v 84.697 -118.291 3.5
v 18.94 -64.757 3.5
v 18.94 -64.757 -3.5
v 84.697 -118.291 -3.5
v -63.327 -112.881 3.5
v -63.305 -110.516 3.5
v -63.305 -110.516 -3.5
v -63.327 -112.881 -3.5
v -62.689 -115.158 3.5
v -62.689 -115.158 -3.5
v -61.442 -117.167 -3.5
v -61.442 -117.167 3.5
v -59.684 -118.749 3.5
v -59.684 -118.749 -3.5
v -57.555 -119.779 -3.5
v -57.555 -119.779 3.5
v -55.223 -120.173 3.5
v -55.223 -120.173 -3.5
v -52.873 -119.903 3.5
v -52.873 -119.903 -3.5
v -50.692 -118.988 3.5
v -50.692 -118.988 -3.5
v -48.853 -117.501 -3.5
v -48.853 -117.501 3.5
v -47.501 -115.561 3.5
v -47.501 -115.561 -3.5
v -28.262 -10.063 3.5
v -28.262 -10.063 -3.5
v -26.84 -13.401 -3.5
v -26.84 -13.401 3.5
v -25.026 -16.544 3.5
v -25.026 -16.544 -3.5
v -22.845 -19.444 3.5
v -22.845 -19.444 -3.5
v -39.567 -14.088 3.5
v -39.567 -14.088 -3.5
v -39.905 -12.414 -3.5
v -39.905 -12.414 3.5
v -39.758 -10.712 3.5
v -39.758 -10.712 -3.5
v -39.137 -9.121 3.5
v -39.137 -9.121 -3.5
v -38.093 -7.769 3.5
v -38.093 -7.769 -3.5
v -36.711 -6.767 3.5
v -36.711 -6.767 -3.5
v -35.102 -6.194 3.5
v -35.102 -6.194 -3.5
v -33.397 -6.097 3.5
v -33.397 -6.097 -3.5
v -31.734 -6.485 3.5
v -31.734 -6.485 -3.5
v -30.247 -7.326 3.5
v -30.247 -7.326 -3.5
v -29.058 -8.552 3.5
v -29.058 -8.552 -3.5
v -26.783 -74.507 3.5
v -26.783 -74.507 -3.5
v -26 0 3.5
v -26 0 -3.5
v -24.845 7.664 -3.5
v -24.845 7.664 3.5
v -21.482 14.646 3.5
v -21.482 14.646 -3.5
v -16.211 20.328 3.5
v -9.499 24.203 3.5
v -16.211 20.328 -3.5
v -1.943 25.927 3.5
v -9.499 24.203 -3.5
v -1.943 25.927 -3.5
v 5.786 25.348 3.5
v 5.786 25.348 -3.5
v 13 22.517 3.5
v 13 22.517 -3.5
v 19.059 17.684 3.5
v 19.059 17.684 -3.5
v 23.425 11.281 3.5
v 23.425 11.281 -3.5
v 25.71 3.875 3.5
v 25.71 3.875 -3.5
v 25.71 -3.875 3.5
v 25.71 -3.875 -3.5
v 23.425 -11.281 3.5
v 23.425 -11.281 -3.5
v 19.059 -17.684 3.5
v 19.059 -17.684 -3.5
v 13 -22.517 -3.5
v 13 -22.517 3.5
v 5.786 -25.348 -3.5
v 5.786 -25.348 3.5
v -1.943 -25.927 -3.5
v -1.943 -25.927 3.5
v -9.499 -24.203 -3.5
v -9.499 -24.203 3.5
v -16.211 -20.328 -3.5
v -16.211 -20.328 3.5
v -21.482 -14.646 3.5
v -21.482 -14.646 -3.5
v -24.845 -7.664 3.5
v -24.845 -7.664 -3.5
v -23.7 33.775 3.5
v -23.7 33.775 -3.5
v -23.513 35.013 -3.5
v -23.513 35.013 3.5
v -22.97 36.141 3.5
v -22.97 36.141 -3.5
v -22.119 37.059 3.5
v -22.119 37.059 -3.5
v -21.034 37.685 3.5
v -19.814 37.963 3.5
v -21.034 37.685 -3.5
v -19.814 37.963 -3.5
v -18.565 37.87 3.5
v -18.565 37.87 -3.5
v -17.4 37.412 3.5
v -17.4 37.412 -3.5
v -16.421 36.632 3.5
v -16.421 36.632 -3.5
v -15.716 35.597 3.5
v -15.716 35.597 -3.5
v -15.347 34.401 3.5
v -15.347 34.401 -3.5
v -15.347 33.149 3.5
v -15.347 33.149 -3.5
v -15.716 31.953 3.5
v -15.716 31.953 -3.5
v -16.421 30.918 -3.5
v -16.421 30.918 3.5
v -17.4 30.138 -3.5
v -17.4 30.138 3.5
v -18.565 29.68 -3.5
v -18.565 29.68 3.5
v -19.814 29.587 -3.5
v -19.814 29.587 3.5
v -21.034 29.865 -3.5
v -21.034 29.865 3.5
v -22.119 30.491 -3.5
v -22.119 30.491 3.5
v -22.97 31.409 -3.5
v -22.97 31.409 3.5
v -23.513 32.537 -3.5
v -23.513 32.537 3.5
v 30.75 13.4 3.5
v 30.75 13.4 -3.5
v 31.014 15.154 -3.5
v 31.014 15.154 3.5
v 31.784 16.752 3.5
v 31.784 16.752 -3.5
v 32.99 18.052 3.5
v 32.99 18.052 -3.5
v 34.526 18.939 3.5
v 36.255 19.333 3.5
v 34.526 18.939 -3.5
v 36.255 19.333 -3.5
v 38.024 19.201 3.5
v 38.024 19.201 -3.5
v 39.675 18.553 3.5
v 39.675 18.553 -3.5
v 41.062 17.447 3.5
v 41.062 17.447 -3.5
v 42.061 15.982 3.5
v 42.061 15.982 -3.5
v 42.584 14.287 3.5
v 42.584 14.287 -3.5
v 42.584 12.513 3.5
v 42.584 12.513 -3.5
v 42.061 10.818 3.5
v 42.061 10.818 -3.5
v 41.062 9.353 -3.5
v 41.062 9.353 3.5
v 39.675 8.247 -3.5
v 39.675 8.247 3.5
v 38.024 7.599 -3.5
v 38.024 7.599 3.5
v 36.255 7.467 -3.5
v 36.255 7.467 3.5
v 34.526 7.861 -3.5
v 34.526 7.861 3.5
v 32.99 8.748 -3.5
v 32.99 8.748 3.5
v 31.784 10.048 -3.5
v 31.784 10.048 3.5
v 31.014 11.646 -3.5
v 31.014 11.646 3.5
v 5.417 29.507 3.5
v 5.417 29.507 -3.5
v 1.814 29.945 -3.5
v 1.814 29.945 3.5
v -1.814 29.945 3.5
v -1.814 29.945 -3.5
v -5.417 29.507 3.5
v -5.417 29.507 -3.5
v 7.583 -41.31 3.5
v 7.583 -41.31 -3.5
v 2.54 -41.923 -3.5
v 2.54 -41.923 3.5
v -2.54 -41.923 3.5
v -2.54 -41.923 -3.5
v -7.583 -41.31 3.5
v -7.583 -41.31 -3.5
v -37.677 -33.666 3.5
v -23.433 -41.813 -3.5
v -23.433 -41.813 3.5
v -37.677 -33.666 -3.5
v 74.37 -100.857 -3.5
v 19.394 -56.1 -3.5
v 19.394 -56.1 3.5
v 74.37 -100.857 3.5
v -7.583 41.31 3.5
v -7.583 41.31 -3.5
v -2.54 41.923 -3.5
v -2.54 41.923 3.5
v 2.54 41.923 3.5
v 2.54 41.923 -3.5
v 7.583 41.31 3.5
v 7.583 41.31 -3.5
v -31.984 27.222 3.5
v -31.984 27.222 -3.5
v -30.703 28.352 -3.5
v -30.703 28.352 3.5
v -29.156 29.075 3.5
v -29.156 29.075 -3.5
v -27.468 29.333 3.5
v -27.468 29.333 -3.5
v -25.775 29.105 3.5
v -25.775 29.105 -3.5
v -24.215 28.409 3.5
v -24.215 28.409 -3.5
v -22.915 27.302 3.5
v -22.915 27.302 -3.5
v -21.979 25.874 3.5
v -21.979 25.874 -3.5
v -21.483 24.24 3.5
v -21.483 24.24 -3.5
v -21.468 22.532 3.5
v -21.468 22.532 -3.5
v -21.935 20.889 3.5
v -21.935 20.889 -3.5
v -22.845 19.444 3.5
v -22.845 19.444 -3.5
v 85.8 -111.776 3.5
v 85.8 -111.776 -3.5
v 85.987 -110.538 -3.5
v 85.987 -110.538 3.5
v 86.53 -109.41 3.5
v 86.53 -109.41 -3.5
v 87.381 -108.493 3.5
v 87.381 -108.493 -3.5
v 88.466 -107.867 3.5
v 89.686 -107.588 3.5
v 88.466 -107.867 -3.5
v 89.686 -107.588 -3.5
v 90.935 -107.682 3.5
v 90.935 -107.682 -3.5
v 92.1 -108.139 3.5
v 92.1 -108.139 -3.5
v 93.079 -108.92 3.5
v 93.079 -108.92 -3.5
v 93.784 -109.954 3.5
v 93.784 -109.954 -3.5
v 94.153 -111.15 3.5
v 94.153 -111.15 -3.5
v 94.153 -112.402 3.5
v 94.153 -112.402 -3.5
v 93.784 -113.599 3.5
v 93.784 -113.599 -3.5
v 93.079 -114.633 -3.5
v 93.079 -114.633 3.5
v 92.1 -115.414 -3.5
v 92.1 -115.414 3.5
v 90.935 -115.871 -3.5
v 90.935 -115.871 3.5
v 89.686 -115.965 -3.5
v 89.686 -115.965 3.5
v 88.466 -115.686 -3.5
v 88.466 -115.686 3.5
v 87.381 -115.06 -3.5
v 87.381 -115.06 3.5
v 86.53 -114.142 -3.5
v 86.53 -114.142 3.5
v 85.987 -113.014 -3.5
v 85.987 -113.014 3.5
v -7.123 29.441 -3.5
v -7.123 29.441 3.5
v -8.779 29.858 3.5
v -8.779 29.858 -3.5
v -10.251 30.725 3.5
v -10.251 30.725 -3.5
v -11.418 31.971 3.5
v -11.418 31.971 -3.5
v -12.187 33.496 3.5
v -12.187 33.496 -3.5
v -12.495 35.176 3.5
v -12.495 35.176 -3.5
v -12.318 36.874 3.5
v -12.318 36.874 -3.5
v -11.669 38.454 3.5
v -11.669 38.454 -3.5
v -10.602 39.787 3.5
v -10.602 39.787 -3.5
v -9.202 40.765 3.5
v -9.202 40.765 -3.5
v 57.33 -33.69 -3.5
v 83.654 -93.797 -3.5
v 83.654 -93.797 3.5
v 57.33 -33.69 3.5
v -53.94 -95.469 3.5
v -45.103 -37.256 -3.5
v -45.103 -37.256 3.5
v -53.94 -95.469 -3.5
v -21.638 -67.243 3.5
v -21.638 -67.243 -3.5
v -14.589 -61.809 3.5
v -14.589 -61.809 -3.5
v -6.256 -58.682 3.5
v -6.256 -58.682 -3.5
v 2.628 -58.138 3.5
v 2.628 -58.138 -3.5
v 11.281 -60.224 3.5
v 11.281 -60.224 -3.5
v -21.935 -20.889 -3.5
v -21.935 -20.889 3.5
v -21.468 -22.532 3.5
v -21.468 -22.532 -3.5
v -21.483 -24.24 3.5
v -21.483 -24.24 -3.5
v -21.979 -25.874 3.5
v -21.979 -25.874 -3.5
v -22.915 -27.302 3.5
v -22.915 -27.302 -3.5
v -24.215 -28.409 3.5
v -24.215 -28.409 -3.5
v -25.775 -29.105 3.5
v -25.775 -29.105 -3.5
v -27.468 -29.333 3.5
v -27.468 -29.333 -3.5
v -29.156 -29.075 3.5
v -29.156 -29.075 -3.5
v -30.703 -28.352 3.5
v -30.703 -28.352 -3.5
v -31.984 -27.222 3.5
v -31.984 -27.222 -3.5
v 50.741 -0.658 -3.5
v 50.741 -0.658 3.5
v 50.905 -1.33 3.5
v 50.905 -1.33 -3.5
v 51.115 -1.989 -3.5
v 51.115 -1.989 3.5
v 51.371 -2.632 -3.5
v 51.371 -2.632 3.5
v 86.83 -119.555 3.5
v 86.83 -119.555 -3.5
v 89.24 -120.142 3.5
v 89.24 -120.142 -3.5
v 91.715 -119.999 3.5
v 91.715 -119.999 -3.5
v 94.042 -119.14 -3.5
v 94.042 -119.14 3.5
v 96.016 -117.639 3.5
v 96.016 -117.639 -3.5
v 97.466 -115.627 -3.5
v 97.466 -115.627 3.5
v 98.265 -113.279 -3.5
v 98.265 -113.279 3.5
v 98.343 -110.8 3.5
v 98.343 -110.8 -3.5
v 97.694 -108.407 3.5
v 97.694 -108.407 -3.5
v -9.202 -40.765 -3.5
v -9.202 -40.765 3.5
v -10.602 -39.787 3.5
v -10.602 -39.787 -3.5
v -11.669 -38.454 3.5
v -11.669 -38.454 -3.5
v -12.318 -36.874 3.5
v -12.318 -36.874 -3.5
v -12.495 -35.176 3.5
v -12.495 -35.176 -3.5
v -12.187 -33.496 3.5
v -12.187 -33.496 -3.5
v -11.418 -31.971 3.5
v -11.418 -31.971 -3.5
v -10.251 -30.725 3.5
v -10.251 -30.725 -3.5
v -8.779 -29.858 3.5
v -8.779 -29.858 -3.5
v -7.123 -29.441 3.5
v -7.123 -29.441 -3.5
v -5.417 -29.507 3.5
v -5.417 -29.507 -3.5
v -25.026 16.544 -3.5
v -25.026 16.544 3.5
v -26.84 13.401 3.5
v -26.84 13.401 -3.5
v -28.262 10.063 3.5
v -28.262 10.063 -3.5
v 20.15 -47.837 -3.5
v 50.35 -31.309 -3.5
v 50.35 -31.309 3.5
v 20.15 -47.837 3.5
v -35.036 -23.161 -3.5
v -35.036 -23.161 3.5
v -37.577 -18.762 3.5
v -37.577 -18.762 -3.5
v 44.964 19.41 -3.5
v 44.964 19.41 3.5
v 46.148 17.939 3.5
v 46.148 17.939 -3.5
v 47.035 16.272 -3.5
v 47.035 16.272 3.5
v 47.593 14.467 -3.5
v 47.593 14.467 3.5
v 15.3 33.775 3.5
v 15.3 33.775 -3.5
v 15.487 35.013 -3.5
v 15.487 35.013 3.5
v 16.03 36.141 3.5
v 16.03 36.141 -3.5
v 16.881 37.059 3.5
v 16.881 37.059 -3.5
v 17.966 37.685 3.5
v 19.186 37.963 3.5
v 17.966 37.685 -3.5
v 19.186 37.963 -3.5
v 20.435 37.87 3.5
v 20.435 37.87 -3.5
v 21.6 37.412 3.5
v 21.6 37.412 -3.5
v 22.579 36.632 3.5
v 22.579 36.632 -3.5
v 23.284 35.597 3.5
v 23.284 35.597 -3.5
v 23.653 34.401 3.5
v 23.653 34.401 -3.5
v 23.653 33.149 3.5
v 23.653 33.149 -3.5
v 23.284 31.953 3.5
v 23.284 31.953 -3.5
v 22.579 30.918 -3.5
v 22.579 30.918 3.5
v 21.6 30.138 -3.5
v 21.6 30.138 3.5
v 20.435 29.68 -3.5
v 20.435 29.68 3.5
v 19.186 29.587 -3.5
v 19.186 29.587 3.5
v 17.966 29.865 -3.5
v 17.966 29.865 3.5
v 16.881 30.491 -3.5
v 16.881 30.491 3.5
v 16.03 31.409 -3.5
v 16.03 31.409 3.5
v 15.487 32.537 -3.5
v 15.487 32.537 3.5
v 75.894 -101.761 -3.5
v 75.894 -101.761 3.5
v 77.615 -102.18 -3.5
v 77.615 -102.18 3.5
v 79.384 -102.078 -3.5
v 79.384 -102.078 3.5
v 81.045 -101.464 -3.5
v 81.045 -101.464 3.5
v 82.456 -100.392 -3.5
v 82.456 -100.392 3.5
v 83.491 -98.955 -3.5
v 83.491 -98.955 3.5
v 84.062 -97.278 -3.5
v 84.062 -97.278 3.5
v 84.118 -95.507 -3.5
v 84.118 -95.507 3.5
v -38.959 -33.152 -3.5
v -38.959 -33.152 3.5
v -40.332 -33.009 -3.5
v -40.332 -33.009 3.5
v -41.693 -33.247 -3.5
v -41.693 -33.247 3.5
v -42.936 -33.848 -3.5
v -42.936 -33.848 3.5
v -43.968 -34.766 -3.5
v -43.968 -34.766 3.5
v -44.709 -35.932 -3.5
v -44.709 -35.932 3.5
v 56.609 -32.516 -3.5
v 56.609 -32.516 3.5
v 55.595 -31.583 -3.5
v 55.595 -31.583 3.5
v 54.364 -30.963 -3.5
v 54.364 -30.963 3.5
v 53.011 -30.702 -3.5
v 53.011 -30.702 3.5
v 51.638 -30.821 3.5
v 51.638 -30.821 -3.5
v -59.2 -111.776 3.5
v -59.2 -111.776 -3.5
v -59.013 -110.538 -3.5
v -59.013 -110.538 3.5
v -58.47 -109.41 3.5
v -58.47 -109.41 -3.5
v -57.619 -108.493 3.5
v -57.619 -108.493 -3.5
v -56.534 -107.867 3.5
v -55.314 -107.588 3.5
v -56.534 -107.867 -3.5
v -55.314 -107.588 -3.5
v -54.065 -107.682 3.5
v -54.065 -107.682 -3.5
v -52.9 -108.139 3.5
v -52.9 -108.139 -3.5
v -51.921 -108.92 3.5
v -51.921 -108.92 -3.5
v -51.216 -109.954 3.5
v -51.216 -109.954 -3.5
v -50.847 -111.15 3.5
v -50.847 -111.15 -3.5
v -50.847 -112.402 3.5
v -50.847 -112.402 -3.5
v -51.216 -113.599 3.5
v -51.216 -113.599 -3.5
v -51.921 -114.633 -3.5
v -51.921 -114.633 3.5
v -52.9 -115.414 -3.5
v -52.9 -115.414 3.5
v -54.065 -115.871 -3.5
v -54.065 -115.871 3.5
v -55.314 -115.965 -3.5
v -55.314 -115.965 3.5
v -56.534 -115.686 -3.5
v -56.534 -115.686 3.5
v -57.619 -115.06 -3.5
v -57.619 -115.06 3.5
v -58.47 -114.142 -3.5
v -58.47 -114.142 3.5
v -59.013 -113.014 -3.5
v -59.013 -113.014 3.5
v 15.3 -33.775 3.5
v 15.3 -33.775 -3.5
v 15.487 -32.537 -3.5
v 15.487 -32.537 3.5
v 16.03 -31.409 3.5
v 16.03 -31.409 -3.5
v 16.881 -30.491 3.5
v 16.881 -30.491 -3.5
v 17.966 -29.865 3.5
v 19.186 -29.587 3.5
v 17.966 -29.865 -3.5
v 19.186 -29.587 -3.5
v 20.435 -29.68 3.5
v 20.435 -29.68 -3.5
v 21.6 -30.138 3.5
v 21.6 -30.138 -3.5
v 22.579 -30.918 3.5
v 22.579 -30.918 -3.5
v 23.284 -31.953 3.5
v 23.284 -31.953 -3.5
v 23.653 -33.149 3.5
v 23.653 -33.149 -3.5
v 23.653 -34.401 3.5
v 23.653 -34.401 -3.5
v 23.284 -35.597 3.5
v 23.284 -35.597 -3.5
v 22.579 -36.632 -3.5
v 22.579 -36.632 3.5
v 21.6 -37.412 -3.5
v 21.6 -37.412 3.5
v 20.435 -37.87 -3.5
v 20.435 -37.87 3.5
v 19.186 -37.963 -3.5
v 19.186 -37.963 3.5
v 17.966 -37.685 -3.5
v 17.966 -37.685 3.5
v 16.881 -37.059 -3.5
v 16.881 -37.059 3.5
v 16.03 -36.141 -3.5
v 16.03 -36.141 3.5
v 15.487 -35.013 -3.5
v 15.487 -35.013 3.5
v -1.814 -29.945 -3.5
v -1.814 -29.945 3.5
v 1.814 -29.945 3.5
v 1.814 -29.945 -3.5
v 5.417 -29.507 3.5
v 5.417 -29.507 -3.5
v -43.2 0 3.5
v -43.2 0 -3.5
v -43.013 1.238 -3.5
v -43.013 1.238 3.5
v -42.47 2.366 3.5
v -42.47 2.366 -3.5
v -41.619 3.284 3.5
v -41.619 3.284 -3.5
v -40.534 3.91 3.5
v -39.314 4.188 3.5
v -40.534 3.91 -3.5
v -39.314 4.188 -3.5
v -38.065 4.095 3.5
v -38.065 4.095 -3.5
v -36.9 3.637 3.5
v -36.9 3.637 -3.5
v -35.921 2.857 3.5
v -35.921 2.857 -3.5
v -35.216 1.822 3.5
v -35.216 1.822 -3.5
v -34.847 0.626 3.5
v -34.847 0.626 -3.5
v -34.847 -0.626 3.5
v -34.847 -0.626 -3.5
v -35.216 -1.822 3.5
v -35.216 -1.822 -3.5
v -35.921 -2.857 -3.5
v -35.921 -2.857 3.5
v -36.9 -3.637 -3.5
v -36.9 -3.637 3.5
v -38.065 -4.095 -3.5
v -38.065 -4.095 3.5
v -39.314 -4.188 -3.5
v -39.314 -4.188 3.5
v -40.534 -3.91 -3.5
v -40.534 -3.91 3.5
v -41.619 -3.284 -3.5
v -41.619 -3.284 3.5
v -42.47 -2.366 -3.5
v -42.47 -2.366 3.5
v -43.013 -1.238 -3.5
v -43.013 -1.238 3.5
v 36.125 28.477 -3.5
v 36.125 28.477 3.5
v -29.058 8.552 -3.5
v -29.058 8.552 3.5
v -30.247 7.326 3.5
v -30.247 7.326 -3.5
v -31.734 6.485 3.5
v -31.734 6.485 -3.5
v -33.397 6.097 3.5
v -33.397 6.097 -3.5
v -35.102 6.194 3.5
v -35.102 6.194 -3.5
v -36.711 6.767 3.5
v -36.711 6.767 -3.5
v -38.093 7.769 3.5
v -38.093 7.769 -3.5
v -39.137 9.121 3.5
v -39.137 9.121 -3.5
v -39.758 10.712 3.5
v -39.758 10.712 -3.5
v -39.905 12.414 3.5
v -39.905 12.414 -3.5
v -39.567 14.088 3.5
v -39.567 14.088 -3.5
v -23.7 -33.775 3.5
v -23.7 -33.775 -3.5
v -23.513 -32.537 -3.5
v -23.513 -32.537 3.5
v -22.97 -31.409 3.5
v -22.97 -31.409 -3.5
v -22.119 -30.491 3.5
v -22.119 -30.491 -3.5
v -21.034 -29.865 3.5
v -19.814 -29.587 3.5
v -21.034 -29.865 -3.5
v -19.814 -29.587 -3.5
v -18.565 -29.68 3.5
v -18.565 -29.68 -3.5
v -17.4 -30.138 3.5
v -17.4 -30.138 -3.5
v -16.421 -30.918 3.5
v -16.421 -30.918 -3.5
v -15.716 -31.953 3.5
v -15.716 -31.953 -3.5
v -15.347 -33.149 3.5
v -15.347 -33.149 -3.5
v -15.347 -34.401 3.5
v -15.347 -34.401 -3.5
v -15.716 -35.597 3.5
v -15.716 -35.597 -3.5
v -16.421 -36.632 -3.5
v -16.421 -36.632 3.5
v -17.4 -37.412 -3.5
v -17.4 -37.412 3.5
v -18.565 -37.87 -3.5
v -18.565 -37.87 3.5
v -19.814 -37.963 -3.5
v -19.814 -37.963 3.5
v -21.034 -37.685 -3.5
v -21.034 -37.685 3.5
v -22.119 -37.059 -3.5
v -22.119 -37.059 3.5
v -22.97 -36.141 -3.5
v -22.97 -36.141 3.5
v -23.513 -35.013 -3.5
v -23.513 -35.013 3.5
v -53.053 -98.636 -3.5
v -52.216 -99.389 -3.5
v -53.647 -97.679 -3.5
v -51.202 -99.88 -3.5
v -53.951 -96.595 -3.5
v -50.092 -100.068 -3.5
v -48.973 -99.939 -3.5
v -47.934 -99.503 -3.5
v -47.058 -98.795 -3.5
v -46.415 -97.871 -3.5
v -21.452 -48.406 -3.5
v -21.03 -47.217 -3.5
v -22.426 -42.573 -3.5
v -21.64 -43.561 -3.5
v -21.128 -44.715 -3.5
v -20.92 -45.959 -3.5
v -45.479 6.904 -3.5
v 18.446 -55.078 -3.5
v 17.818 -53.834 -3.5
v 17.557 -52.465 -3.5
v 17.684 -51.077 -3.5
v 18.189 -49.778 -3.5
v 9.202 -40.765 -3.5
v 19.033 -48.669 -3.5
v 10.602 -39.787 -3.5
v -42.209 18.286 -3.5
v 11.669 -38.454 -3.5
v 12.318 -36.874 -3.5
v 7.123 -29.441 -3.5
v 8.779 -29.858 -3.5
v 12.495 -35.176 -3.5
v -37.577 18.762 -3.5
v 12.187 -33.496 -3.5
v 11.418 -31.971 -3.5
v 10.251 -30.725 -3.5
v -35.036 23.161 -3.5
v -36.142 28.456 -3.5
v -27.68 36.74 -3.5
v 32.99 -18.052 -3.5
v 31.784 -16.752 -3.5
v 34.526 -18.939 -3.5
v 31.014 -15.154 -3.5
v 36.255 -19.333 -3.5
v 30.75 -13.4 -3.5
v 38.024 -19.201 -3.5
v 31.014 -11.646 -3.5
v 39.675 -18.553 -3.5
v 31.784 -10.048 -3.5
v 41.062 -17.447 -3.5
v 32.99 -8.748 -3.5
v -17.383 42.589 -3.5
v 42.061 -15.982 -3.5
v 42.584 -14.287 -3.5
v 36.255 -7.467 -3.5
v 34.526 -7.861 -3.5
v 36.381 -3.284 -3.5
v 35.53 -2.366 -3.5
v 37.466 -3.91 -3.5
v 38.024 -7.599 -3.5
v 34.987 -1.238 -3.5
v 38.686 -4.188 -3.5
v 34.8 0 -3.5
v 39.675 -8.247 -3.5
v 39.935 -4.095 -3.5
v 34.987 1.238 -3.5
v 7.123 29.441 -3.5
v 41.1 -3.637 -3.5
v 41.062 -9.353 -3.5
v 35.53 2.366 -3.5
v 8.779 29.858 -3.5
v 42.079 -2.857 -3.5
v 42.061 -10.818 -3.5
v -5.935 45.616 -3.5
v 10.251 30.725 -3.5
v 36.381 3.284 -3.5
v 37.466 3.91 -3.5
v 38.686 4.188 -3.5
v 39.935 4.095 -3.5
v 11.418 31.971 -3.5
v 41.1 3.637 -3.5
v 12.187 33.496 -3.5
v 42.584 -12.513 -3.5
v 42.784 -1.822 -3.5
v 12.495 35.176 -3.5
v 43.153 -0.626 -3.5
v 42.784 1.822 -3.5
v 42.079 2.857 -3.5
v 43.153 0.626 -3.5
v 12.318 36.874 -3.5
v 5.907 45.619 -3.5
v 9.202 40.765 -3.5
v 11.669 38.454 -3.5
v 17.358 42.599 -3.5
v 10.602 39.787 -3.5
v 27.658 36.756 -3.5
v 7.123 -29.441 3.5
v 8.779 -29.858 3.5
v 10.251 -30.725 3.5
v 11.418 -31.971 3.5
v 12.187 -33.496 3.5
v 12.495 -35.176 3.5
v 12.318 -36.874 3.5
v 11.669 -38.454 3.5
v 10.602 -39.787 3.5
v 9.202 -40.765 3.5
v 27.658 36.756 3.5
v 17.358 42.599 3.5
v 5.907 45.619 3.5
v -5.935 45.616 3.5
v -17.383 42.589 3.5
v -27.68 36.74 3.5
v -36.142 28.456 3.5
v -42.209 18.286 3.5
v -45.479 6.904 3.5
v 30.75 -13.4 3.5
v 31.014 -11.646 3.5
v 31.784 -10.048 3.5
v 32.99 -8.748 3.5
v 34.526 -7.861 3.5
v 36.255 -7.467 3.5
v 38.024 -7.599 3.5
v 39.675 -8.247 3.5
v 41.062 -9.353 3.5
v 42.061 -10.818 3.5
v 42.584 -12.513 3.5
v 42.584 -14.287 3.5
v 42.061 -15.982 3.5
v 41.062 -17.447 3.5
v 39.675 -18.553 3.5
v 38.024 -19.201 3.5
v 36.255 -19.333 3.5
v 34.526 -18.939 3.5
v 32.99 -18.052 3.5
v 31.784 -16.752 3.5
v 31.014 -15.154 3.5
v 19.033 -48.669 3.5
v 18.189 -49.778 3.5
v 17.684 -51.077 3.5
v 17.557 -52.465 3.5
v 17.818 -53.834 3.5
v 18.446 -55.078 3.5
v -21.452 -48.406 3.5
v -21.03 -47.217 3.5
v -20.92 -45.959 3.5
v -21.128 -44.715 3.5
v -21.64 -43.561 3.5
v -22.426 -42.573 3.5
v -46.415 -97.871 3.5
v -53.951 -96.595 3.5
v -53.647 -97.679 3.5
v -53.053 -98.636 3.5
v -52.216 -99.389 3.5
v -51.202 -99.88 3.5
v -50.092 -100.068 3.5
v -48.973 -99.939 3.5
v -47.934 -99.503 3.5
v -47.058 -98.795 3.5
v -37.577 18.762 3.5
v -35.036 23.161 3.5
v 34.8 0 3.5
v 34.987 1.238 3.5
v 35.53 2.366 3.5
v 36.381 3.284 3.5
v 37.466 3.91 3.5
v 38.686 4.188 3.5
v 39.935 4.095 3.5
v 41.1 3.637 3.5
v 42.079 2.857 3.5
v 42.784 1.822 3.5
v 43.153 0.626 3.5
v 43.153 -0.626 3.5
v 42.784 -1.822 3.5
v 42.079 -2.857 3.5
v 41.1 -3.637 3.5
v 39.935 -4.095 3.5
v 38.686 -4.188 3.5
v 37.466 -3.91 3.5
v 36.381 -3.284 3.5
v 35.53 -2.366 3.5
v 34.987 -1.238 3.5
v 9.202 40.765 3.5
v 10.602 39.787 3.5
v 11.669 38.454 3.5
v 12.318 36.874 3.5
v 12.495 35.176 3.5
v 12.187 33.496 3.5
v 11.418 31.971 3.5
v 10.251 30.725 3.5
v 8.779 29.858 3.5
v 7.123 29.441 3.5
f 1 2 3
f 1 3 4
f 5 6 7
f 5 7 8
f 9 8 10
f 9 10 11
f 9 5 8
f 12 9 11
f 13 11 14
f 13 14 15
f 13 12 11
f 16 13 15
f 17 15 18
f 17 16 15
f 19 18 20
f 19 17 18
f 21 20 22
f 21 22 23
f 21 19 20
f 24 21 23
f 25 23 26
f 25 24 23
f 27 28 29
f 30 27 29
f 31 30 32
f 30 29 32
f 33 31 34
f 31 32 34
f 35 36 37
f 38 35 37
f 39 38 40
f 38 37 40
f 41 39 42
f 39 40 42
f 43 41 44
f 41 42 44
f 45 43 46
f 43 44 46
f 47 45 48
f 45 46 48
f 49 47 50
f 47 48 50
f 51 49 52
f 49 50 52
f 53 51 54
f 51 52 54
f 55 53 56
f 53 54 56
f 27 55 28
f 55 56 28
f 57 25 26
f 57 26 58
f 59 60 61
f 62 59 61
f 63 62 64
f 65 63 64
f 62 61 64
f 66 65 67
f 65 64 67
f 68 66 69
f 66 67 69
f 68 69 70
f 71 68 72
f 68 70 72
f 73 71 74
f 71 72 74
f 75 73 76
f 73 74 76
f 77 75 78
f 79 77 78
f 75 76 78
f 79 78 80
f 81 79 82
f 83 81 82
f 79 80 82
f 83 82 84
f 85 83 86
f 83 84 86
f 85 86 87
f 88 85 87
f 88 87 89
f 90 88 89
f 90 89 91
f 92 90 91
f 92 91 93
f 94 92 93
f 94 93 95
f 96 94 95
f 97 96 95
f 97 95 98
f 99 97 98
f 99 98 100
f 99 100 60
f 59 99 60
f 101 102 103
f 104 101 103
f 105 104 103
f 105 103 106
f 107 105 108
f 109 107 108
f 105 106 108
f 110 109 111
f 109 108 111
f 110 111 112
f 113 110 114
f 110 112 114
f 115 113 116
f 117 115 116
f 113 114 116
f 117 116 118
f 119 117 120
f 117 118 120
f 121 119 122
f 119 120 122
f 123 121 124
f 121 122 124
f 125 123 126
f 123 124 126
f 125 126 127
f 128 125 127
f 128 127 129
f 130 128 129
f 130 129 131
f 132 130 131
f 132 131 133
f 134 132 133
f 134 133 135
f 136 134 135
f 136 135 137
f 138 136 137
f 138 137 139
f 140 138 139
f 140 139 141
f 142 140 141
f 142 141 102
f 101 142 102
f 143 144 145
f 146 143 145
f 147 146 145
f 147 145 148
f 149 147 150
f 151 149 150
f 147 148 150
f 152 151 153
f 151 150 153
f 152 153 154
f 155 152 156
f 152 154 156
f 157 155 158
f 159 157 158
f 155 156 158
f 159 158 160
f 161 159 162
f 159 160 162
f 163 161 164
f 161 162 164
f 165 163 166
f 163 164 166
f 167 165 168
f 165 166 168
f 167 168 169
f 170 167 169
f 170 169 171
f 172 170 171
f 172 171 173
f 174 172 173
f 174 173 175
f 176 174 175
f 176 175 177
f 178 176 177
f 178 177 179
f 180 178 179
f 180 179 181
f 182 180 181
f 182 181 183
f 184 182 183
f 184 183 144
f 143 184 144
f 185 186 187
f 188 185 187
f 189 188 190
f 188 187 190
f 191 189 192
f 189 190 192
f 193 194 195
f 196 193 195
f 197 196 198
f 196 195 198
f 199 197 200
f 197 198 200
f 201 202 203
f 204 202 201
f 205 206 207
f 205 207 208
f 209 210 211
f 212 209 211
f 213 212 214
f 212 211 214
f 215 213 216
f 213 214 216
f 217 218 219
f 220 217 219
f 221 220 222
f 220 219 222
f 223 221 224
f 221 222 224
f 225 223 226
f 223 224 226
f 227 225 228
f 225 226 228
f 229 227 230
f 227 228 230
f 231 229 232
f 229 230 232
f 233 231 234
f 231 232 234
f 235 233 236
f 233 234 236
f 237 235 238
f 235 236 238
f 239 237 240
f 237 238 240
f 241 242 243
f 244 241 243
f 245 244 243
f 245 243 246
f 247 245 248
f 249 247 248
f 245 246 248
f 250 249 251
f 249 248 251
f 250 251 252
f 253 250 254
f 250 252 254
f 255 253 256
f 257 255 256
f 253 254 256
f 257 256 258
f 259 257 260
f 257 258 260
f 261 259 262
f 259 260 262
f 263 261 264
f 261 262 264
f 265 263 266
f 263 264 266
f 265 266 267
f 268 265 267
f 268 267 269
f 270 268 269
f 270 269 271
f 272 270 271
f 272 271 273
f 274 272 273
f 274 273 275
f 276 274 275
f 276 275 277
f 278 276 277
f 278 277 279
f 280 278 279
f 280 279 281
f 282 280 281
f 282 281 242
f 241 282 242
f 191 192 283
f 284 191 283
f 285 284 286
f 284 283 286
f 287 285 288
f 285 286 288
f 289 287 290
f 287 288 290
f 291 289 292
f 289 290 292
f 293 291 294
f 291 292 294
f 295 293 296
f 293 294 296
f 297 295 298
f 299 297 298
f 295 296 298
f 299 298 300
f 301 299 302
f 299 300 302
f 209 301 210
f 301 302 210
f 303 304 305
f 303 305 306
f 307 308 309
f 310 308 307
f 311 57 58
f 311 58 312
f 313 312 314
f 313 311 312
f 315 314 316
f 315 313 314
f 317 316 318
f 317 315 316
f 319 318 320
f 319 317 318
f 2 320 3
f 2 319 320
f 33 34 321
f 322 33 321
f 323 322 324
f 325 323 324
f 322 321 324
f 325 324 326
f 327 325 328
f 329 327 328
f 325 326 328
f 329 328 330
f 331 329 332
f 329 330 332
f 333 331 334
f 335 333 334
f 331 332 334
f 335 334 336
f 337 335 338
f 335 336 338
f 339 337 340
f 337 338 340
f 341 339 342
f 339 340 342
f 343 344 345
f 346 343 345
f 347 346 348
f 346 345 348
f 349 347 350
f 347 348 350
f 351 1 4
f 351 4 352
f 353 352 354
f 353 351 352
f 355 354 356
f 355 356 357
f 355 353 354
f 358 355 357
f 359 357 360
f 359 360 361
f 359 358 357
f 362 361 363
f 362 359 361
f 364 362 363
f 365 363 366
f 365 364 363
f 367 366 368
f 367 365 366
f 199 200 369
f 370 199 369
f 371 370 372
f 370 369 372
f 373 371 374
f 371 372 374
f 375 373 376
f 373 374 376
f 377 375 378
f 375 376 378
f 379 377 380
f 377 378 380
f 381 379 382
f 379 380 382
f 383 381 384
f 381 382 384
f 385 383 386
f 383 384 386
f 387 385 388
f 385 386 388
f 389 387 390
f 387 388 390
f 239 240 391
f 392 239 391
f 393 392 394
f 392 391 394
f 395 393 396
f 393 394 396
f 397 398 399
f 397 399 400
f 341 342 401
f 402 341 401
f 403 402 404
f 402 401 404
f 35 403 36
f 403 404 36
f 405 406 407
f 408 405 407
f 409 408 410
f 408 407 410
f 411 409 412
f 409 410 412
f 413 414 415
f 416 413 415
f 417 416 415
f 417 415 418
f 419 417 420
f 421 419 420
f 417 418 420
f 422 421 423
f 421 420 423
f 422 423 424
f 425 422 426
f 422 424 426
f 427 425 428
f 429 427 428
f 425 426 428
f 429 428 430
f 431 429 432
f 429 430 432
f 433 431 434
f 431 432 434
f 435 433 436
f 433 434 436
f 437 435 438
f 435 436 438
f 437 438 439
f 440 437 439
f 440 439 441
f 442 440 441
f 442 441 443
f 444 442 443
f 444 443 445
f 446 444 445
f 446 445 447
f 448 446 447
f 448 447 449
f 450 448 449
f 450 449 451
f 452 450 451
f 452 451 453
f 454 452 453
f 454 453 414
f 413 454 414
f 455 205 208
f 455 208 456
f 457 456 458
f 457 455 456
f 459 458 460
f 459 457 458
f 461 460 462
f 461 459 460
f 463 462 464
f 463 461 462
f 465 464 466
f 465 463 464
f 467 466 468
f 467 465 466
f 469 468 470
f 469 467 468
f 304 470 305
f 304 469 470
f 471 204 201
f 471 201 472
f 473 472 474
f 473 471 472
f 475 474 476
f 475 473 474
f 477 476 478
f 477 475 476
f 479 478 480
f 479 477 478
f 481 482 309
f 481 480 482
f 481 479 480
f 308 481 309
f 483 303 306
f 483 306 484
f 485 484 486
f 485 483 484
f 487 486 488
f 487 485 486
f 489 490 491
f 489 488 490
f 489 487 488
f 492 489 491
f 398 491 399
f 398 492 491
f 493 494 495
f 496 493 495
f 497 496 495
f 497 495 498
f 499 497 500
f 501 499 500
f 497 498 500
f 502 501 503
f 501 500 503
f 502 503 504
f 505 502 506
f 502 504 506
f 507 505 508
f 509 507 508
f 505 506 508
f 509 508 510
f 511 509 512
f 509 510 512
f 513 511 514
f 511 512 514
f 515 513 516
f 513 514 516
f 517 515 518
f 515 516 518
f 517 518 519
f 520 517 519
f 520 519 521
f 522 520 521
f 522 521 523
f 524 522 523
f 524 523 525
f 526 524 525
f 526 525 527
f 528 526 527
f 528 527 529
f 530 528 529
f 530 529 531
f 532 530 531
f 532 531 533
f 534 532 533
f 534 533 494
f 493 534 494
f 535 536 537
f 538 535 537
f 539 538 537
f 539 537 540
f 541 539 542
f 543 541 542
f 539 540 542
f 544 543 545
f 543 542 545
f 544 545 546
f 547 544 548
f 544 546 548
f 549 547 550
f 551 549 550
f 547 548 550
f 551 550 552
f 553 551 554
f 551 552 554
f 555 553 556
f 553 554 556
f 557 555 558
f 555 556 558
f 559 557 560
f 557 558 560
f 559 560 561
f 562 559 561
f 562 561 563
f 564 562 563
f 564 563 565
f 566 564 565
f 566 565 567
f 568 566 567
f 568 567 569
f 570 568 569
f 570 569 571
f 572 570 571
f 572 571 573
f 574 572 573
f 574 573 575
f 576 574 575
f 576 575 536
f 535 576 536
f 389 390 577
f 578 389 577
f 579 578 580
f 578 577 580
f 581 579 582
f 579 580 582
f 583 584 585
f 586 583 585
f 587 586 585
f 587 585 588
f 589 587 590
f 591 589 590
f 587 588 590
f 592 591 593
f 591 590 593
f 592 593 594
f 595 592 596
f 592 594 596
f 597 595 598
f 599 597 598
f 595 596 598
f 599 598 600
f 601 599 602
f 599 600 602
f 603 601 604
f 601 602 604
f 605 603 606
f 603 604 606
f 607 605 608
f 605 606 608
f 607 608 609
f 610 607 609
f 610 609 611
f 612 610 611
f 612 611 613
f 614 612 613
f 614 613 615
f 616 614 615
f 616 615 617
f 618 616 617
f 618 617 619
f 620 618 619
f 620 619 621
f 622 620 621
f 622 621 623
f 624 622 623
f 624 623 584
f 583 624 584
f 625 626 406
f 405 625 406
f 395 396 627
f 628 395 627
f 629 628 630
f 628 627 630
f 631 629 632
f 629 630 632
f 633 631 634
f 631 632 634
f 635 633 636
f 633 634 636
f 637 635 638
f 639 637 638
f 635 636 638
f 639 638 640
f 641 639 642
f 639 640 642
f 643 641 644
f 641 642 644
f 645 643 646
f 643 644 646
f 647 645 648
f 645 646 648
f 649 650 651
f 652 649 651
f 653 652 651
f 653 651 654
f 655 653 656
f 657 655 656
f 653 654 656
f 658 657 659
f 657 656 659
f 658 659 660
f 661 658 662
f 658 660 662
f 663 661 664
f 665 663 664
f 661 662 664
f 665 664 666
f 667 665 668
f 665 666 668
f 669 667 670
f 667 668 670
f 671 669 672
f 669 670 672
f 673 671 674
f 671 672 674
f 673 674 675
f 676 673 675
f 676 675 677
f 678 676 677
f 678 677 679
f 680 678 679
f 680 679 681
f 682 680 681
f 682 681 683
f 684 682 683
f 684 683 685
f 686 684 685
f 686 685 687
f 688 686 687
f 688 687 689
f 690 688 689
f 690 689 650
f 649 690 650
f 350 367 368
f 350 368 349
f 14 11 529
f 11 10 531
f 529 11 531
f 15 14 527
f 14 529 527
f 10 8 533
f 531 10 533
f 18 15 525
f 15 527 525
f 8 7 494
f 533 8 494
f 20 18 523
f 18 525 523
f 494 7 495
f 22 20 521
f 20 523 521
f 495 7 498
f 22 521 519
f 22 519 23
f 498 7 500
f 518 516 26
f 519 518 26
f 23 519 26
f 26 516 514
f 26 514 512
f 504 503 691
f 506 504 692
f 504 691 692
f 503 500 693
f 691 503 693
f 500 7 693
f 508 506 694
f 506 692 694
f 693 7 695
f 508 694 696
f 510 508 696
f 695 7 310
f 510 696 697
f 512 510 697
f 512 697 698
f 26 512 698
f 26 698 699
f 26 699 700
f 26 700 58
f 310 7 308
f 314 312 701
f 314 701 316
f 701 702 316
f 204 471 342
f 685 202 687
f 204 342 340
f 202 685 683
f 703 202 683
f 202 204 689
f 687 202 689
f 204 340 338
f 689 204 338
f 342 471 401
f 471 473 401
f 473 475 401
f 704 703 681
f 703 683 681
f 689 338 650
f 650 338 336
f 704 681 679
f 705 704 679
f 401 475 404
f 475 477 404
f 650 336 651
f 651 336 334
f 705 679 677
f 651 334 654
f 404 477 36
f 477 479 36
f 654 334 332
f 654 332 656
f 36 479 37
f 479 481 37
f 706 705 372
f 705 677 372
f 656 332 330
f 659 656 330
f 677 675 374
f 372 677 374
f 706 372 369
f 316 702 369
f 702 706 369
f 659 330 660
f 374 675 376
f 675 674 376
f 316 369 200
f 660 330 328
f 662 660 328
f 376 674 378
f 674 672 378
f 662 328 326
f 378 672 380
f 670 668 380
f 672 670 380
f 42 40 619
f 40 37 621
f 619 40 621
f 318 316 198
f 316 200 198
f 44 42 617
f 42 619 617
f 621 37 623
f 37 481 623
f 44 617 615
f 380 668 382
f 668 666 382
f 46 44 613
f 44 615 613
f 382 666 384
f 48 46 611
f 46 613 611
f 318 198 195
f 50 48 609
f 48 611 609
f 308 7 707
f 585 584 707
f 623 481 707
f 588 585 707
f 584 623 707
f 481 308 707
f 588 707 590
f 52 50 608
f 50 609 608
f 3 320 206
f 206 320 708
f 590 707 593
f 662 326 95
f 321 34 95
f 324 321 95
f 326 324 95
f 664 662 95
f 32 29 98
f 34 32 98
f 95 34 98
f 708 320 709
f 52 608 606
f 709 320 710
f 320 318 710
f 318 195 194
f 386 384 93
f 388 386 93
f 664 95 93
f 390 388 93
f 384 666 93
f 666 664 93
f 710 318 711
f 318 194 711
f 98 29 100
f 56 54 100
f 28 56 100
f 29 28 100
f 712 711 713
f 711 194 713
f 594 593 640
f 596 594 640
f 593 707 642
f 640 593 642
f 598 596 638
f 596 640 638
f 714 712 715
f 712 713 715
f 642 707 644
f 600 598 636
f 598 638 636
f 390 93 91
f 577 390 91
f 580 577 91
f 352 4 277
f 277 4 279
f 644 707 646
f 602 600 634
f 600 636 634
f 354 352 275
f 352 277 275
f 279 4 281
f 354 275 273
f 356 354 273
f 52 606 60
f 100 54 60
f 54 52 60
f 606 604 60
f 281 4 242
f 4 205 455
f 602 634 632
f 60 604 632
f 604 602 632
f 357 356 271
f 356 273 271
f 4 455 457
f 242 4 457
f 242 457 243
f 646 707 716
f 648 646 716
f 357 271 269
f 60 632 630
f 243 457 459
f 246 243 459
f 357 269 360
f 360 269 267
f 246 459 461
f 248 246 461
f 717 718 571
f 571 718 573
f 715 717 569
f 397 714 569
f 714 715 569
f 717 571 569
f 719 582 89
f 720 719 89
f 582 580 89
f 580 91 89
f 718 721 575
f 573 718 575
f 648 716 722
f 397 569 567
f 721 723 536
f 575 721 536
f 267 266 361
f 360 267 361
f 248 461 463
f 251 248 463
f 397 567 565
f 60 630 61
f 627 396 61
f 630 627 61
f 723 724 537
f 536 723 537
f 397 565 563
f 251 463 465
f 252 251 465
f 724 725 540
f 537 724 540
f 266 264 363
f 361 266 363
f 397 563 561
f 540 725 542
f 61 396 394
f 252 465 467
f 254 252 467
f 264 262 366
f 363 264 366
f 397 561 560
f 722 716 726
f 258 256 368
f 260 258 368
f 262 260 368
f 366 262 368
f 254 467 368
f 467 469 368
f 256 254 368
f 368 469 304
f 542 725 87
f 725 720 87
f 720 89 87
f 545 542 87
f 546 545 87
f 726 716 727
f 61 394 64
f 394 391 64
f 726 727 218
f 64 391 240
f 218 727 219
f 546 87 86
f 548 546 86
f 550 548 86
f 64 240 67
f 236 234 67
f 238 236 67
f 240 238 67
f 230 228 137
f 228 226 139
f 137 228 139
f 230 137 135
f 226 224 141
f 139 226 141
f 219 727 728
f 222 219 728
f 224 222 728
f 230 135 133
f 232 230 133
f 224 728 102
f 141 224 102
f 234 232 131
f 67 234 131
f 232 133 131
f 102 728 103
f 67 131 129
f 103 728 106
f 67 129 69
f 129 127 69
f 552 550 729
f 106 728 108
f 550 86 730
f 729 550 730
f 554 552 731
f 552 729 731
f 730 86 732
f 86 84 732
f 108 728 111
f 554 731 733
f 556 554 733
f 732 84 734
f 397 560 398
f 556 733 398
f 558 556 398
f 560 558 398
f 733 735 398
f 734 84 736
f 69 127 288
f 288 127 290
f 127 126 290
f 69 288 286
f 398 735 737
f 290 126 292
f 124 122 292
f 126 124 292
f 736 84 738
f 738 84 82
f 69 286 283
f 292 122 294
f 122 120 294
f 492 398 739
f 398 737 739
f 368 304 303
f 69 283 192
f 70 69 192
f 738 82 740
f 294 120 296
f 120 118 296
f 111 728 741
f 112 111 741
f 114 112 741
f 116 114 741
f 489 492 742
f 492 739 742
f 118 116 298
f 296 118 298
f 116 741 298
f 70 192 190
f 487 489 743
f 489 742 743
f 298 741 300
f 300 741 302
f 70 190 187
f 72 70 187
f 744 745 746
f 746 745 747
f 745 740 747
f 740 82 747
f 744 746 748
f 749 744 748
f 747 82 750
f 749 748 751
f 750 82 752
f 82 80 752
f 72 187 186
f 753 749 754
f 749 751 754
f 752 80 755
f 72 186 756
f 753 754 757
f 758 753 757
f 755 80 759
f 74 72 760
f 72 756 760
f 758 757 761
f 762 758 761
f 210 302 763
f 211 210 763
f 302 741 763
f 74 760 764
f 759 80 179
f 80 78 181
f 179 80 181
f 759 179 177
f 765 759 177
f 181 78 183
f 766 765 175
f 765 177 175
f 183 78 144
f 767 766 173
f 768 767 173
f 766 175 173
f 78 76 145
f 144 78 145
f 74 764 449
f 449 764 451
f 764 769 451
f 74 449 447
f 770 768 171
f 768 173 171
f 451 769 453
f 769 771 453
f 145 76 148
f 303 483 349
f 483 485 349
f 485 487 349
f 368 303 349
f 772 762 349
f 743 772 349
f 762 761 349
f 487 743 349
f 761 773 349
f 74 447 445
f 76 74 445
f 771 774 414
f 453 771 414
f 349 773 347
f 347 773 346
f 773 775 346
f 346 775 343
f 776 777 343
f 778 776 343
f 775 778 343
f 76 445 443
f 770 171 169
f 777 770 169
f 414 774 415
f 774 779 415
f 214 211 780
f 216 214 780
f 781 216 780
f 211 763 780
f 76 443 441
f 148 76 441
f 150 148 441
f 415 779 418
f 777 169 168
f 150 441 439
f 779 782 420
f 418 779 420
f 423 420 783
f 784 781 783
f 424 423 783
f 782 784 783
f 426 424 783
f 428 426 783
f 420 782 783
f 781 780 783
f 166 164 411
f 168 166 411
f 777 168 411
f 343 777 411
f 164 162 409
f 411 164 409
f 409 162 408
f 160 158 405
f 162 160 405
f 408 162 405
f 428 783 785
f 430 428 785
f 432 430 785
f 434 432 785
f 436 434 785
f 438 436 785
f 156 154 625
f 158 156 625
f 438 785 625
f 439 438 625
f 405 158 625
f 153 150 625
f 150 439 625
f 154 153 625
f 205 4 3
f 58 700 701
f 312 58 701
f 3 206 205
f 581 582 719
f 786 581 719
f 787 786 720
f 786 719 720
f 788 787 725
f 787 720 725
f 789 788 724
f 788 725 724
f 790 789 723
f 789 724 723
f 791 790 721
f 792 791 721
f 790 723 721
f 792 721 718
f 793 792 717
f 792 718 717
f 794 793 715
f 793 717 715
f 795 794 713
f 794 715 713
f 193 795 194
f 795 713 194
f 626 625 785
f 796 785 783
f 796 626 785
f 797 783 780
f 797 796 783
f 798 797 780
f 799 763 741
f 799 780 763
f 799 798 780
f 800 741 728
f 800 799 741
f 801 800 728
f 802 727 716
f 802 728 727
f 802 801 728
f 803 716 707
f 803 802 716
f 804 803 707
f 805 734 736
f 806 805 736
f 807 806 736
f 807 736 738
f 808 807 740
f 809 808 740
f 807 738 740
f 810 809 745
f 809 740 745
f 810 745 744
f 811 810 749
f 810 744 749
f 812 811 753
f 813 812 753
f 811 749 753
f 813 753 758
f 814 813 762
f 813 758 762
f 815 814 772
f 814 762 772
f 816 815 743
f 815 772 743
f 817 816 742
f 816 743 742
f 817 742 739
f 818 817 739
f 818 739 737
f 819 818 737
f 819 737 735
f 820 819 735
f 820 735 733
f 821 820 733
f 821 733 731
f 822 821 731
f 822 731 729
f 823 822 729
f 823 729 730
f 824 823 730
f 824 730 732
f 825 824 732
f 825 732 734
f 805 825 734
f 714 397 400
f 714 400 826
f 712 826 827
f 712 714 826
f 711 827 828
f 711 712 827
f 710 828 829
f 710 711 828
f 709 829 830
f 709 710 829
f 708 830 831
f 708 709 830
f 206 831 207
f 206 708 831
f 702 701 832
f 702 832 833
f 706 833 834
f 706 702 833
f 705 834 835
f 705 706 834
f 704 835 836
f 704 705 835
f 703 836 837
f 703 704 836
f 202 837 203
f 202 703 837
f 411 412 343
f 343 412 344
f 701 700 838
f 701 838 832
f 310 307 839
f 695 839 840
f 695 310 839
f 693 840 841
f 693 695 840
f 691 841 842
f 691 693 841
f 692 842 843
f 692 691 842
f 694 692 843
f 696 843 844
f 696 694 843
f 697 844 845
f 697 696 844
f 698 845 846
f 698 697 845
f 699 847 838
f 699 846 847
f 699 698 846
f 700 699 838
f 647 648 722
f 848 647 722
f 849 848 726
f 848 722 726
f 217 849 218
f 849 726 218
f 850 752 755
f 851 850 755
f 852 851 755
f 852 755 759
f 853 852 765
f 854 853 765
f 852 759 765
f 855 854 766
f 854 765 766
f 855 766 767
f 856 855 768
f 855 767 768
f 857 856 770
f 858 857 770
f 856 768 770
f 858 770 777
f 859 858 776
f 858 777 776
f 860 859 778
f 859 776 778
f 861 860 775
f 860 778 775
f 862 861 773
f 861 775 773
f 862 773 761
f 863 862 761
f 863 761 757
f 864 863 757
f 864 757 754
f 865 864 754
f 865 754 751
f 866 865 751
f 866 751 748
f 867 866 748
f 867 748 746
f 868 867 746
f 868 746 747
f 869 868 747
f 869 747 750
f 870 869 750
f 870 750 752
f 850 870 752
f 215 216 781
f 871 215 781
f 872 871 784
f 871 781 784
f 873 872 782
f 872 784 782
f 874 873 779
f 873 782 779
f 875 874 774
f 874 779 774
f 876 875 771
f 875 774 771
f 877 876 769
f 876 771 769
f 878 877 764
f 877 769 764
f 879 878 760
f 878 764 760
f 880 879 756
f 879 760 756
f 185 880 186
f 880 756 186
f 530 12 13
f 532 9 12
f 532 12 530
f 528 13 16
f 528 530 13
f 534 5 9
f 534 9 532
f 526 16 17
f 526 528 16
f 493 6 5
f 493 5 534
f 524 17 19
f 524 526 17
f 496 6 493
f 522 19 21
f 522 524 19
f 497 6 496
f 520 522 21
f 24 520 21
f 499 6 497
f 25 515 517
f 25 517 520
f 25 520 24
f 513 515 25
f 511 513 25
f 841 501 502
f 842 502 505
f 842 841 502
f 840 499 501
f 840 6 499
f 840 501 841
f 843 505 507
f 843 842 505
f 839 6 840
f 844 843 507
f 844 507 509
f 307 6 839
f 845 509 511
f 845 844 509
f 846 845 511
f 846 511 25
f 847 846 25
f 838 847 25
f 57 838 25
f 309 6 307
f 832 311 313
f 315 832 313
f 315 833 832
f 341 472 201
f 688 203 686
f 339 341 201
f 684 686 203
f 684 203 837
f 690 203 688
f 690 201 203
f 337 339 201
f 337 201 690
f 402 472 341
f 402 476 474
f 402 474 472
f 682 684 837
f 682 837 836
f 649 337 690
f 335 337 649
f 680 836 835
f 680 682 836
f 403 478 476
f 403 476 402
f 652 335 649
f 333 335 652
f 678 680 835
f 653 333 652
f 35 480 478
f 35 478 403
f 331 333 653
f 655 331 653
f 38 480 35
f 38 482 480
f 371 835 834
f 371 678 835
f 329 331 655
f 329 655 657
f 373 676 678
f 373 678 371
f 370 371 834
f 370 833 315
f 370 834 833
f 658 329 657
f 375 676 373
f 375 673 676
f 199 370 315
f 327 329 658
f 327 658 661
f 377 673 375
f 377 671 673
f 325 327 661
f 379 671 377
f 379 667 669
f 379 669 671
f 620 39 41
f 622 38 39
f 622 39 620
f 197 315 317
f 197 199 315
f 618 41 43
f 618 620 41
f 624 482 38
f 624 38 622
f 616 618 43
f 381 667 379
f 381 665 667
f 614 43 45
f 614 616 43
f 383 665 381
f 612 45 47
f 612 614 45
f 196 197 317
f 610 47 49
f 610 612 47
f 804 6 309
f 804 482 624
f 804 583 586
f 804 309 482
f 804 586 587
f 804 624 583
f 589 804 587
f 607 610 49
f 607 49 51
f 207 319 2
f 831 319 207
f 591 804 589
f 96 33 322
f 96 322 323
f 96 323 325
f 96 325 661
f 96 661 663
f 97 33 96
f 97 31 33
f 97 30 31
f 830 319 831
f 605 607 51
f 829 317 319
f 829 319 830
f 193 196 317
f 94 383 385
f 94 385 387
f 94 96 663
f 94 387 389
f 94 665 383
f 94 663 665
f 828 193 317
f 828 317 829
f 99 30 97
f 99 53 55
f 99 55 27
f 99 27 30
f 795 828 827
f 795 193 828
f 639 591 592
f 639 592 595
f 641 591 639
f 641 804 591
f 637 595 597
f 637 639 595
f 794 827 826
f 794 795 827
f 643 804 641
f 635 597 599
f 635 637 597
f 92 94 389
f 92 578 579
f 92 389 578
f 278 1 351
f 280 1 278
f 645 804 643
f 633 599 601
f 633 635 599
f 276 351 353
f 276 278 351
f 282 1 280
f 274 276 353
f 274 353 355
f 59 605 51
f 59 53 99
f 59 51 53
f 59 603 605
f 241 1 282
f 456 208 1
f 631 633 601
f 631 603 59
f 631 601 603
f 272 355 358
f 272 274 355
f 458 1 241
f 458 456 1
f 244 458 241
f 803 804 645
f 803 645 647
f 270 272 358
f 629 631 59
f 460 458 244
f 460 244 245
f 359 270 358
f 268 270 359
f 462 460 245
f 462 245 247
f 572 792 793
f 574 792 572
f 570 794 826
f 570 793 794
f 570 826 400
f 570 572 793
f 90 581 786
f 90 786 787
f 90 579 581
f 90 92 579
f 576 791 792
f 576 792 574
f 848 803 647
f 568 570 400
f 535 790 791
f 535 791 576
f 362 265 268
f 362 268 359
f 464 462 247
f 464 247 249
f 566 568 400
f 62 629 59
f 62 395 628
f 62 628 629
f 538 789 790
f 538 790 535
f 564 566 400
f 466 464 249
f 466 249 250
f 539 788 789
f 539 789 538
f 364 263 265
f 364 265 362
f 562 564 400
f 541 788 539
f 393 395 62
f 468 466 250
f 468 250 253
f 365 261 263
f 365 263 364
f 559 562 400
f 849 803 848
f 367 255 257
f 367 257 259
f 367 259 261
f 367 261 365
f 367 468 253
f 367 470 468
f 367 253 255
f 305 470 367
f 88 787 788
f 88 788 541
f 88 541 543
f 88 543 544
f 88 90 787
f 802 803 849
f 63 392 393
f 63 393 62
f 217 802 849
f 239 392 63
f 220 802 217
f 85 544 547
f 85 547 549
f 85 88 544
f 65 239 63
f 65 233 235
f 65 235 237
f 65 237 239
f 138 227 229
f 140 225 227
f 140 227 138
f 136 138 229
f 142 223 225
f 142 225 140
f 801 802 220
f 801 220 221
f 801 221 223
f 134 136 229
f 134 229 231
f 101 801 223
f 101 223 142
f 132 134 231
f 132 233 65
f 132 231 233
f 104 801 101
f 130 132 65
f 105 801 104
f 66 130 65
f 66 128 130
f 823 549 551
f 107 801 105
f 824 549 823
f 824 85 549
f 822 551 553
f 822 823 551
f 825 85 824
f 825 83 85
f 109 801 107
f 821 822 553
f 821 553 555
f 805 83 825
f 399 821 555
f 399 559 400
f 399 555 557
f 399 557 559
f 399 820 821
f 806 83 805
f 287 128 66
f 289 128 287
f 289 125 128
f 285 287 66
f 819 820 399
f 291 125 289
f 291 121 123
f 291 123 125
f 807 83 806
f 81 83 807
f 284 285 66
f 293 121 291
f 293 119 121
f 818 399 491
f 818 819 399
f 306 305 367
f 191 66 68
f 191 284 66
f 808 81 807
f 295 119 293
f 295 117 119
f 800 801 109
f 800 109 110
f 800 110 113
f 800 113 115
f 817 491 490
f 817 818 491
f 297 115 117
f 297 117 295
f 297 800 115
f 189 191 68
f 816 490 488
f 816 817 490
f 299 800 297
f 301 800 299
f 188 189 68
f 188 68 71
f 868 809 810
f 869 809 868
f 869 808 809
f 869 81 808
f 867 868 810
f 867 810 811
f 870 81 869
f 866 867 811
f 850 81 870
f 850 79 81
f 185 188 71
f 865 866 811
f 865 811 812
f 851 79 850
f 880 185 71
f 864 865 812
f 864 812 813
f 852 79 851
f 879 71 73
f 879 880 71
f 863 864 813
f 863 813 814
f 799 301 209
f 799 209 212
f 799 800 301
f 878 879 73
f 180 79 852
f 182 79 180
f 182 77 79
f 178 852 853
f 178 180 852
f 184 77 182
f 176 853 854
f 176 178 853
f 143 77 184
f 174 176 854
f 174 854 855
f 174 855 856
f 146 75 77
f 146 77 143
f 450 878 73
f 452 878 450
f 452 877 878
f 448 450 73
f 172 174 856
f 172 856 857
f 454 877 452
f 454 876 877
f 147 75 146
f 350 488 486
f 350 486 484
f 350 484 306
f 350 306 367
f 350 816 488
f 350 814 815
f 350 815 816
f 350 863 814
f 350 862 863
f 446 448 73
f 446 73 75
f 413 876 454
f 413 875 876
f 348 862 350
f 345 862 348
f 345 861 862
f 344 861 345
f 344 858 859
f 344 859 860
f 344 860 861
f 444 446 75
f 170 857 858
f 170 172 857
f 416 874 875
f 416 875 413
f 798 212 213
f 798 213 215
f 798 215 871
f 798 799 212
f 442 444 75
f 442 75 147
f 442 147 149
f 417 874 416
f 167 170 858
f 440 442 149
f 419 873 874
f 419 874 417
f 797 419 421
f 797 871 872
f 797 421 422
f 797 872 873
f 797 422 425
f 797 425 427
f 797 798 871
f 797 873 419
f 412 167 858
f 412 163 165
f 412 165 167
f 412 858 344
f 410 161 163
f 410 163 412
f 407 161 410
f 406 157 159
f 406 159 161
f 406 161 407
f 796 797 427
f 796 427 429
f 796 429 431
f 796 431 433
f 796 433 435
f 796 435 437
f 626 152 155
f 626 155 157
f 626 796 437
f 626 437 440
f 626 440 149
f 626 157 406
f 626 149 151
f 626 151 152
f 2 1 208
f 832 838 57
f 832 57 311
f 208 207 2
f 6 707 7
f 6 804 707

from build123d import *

# Parameters (mm, degrees)
BOSS_EXTRUDE1_DEPTH = 3.5
BOSS_EXTRUDE4_DEPTH = 7
SKETCH3_R           = 26
SKETCH3_R_2         = 4.2
SKETCH3_R_3         = 5.95
CUT_EXTRUDE1_DEPTH  = 156.479666598
CUT_EXTRUDE3_DEPTH  = 156.479666598
CUT_EXTRUDE5_DEPTH  = 156.479666598
CUT_EXTRUDE6_DEPTH  = 156.479666598
CIRPATTERN1_COUNT   = 6


with BuildPart() as part:
    # Sketch2 → Boss-Extrude1 (new, symmetric)
    with BuildSketch(Plane.XY):
        with BuildLine():
            Line((-45.478900867, 6.904315749), (-63.304842767, -110.515610278))
            ThreePointArc((-63.304842767, -110.515610278), (-57.554578813, -119.77853103), (-47.500804036, -115.560848118))
            Line((-47.500804036, -115.560848118), (-26.78284273, -74.506517319))
            ThreePointArc((-26.78284273, -74.506517319), (-6.255979799, -58.681947165), (18.940409864, -64.757395322))
            Line((18.940409864, -64.757395322), (84.696685238, -118.290602278))
            ThreePointArc((84.696685238, -118.290602278), (95.084548335, -118.462755244), (97.694455028, -108.406626595))
            Line((97.694455028, -108.406626595), (42.136301343, 18.453512109))
            ThreePointArc((42.136301343, 18.453512109), (-6.011591057, 45.605490601), (-45.478900867, 6.904315749))
        make_face()
    extrude(amount=BOSS_EXTRUDE1_DEPTH, both=True)

    # Sketch4 → Boss-Extrude4 (add, through all)
    with BuildSketch(Plane.XY.offset(3.5)):
        with BuildLine():
            Line((29.393386496, 35.38401942), (44.963587603, 19.409766638))
            ThreePointArc((44.963587603, 19.409766638), (46.631084985, 17.126299569), (47.592760093, 14.467361743))
            Line((47.592760093, 14.467361743), (50.74066814, -0.658267229))
            ThreePointArc((50.74066814, -0.658267229), (51.004474494, -1.661692304), (51.370828532, -2.632382983))
            Line((51.370828532, -2.632382983), (97.694455028, -108.406626595))
            ThreePointArc((97.694455028, -108.406626595), (95.084548335, -118.462755244), (84.696685238, -118.290602278))
            Line((84.696685238, -118.290602278), (18.940409864, -64.757395322))
            ThreePointArc((18.940409864, -64.757395322), (-6.255979799, -58.681947165), (-26.78284273, -74.506517319))
            Line((-26.78284273, -74.506517319), (-47.500804036, -115.560848118))
            ThreePointArc((-47.500804036, -115.560848118), (-57.554578813, -119.77853103), (-63.304842767, -110.515610278))
            Line((-63.304842767, -110.515610278), (-45.478900867, 6.904315749))
            ThreePointArc((-45.478900867, 6.904315749), (-16.354183668, 42.994658698), (29.393386496, 35.38401942))
        make_face()
    extrude(amount=-BOSS_EXTRUDE4_DEPTH)

    # Sketch3 → Cut-Extrude1 (cut, through all)
    with BuildSketch(Plane(origin=(0, 0, -3.5), x_dir=(-1, 0, 0), z_dir=(0, 0, -1))):
        Circle(SKETCH3_R)
        with Locations((19.5, 33.774990748)):
            Circle(SKETCH3_R_2)
        with Locations((-19.5, 33.774990748)):
            Circle(SKETCH3_R_2)
        with Locations((-36.7, 13.4)):
            Circle(SKETCH3_R_3)
        with Locations((-39, 0)):
            Circle(SKETCH3_R_2)
        with Locations((-36.7, -13.4)):
            Circle(SKETCH3_R_3)
        with Locations((-19.5, -33.774990748)):
            Circle(SKETCH3_R_2)
        with Locations((19.5, -33.774990748)):
            Circle(SKETCH3_R_2)
        with Locations((39, 0)):
            Circle(SKETCH3_R_2)
        with Locations((-90, -111.776398371)):
            Circle(SKETCH3_R_2)
        with Locations((55, -111.776398371)):
            Circle(SKETCH3_R_2)
    extrude(amount=-CUT_EXTRUDE1_DEPTH, mode=Mode.SUBTRACT)

    # Sketch5 → Cut-Extrude3 (cut, through all)
    with BuildSketch(Plane(origin=(0, 0, -3.5), x_dir=(-1, 0, 0), z_dir=(0, 0, -1))):
        with BuildLine():
            Line((-50.350110091, -31.309459743), (-20.150300754, -47.836521791))
            ThreePointArc((-20.150300754, -47.836521791), (-17.571466955, -51.766920177), (-19.393917714, -56.100173974))
            Line((-19.393917714, -56.100173974), (-74.370376325, -100.857364368))
            ThreePointArc((-74.370376325, -100.857364368), (-81.790278537, -100.980330772), (-83.654497603, -93.797381737))
            Line((-83.654497603, -93.797381737), (-57.330494783, -33.689793067))
            ThreePointArc((-57.330494783, -33.689793067), (-54.364230538, -30.963194657), (-50.350110091, -31.309459743))
        make_face()
    extrude(amount=-CUT_EXTRUDE3_DEPTH, mode=Mode.SUBTRACT)

    # Sketch7 → Cut-Extrude5 (cut, through all)
    with BuildSketch(Plane(origin=(0, 0, -3.5), x_dir=(-1, 0, 0), z_dir=(0, 0, -1))):
        with BuildLine():
            Line((23.433420065, -41.81343059), (37.676807322, -33.666002693))
            ThreePointArc((37.676807322, -33.666002693), (42.335474705, -33.504479598), (45.102778478, -37.255652924))
            Line((45.102778478, -37.255652924), (53.940298501, -95.468618789))
            ThreePointArc((53.940298501, -95.468618789), (51.202077571, -99.879533433), (46.414565772, -97.871112999))
            Line((46.414565772, -97.871112999), (21.45222531, -48.406198584))
            ThreePointArc((21.45222531, -48.406198584), (21.12757408, -44.71456882), (23.433420065, -41.81343059))
        make_face()
    extrude(amount=-CUT_EXTRUDE5_DEPTH, mode=Mode.SUBTRACT)

    # Sketch8 → Cut-Extrude6 (cut, through all)
    with BuildSketch(Plane(origin=(0, 0, -3.5), x_dir=(-1, 0, 0), z_dir=(0, 0, -1))):
        with BuildLine():
            ThreePointArc((7.583333333, 41.309721078), (0, 42), (-7.583333333, 41.309721078))
            ThreePointArc((-7.583333333, 41.309721078), (-12.401388725, 34.324999019), (-5.416666667, 29.506943627))
            ThreePointArc((-5.416666667, 29.506943627), (0, 30), (5.416666667, 29.506943627))
            ThreePointArc((5.416666667, 29.506943627), (12.401388725, 34.324999019), (7.583333333, 41.309721078))
        make_face()
    cut_extrude6 = extrude(amount=-CUT_EXTRUDE6_DEPTH, mode=Mode.SUBTRACT)

    # CirPattern1: Cut-Extrude6 ×6 about axis, 2 skipped
    cirpattern1_axis = Axis((0, 0, 37.050489462), (0, 0, -1))
    add([cut_extrude6.rotate(cirpattern1_axis, i * 360 / CIRPATTERN1_COUNT) for i in range(1, CIRPATTERN1_COUNT) if i not in (1, 2)], mode=Mode.SUBTRACT)


solid = part.part
